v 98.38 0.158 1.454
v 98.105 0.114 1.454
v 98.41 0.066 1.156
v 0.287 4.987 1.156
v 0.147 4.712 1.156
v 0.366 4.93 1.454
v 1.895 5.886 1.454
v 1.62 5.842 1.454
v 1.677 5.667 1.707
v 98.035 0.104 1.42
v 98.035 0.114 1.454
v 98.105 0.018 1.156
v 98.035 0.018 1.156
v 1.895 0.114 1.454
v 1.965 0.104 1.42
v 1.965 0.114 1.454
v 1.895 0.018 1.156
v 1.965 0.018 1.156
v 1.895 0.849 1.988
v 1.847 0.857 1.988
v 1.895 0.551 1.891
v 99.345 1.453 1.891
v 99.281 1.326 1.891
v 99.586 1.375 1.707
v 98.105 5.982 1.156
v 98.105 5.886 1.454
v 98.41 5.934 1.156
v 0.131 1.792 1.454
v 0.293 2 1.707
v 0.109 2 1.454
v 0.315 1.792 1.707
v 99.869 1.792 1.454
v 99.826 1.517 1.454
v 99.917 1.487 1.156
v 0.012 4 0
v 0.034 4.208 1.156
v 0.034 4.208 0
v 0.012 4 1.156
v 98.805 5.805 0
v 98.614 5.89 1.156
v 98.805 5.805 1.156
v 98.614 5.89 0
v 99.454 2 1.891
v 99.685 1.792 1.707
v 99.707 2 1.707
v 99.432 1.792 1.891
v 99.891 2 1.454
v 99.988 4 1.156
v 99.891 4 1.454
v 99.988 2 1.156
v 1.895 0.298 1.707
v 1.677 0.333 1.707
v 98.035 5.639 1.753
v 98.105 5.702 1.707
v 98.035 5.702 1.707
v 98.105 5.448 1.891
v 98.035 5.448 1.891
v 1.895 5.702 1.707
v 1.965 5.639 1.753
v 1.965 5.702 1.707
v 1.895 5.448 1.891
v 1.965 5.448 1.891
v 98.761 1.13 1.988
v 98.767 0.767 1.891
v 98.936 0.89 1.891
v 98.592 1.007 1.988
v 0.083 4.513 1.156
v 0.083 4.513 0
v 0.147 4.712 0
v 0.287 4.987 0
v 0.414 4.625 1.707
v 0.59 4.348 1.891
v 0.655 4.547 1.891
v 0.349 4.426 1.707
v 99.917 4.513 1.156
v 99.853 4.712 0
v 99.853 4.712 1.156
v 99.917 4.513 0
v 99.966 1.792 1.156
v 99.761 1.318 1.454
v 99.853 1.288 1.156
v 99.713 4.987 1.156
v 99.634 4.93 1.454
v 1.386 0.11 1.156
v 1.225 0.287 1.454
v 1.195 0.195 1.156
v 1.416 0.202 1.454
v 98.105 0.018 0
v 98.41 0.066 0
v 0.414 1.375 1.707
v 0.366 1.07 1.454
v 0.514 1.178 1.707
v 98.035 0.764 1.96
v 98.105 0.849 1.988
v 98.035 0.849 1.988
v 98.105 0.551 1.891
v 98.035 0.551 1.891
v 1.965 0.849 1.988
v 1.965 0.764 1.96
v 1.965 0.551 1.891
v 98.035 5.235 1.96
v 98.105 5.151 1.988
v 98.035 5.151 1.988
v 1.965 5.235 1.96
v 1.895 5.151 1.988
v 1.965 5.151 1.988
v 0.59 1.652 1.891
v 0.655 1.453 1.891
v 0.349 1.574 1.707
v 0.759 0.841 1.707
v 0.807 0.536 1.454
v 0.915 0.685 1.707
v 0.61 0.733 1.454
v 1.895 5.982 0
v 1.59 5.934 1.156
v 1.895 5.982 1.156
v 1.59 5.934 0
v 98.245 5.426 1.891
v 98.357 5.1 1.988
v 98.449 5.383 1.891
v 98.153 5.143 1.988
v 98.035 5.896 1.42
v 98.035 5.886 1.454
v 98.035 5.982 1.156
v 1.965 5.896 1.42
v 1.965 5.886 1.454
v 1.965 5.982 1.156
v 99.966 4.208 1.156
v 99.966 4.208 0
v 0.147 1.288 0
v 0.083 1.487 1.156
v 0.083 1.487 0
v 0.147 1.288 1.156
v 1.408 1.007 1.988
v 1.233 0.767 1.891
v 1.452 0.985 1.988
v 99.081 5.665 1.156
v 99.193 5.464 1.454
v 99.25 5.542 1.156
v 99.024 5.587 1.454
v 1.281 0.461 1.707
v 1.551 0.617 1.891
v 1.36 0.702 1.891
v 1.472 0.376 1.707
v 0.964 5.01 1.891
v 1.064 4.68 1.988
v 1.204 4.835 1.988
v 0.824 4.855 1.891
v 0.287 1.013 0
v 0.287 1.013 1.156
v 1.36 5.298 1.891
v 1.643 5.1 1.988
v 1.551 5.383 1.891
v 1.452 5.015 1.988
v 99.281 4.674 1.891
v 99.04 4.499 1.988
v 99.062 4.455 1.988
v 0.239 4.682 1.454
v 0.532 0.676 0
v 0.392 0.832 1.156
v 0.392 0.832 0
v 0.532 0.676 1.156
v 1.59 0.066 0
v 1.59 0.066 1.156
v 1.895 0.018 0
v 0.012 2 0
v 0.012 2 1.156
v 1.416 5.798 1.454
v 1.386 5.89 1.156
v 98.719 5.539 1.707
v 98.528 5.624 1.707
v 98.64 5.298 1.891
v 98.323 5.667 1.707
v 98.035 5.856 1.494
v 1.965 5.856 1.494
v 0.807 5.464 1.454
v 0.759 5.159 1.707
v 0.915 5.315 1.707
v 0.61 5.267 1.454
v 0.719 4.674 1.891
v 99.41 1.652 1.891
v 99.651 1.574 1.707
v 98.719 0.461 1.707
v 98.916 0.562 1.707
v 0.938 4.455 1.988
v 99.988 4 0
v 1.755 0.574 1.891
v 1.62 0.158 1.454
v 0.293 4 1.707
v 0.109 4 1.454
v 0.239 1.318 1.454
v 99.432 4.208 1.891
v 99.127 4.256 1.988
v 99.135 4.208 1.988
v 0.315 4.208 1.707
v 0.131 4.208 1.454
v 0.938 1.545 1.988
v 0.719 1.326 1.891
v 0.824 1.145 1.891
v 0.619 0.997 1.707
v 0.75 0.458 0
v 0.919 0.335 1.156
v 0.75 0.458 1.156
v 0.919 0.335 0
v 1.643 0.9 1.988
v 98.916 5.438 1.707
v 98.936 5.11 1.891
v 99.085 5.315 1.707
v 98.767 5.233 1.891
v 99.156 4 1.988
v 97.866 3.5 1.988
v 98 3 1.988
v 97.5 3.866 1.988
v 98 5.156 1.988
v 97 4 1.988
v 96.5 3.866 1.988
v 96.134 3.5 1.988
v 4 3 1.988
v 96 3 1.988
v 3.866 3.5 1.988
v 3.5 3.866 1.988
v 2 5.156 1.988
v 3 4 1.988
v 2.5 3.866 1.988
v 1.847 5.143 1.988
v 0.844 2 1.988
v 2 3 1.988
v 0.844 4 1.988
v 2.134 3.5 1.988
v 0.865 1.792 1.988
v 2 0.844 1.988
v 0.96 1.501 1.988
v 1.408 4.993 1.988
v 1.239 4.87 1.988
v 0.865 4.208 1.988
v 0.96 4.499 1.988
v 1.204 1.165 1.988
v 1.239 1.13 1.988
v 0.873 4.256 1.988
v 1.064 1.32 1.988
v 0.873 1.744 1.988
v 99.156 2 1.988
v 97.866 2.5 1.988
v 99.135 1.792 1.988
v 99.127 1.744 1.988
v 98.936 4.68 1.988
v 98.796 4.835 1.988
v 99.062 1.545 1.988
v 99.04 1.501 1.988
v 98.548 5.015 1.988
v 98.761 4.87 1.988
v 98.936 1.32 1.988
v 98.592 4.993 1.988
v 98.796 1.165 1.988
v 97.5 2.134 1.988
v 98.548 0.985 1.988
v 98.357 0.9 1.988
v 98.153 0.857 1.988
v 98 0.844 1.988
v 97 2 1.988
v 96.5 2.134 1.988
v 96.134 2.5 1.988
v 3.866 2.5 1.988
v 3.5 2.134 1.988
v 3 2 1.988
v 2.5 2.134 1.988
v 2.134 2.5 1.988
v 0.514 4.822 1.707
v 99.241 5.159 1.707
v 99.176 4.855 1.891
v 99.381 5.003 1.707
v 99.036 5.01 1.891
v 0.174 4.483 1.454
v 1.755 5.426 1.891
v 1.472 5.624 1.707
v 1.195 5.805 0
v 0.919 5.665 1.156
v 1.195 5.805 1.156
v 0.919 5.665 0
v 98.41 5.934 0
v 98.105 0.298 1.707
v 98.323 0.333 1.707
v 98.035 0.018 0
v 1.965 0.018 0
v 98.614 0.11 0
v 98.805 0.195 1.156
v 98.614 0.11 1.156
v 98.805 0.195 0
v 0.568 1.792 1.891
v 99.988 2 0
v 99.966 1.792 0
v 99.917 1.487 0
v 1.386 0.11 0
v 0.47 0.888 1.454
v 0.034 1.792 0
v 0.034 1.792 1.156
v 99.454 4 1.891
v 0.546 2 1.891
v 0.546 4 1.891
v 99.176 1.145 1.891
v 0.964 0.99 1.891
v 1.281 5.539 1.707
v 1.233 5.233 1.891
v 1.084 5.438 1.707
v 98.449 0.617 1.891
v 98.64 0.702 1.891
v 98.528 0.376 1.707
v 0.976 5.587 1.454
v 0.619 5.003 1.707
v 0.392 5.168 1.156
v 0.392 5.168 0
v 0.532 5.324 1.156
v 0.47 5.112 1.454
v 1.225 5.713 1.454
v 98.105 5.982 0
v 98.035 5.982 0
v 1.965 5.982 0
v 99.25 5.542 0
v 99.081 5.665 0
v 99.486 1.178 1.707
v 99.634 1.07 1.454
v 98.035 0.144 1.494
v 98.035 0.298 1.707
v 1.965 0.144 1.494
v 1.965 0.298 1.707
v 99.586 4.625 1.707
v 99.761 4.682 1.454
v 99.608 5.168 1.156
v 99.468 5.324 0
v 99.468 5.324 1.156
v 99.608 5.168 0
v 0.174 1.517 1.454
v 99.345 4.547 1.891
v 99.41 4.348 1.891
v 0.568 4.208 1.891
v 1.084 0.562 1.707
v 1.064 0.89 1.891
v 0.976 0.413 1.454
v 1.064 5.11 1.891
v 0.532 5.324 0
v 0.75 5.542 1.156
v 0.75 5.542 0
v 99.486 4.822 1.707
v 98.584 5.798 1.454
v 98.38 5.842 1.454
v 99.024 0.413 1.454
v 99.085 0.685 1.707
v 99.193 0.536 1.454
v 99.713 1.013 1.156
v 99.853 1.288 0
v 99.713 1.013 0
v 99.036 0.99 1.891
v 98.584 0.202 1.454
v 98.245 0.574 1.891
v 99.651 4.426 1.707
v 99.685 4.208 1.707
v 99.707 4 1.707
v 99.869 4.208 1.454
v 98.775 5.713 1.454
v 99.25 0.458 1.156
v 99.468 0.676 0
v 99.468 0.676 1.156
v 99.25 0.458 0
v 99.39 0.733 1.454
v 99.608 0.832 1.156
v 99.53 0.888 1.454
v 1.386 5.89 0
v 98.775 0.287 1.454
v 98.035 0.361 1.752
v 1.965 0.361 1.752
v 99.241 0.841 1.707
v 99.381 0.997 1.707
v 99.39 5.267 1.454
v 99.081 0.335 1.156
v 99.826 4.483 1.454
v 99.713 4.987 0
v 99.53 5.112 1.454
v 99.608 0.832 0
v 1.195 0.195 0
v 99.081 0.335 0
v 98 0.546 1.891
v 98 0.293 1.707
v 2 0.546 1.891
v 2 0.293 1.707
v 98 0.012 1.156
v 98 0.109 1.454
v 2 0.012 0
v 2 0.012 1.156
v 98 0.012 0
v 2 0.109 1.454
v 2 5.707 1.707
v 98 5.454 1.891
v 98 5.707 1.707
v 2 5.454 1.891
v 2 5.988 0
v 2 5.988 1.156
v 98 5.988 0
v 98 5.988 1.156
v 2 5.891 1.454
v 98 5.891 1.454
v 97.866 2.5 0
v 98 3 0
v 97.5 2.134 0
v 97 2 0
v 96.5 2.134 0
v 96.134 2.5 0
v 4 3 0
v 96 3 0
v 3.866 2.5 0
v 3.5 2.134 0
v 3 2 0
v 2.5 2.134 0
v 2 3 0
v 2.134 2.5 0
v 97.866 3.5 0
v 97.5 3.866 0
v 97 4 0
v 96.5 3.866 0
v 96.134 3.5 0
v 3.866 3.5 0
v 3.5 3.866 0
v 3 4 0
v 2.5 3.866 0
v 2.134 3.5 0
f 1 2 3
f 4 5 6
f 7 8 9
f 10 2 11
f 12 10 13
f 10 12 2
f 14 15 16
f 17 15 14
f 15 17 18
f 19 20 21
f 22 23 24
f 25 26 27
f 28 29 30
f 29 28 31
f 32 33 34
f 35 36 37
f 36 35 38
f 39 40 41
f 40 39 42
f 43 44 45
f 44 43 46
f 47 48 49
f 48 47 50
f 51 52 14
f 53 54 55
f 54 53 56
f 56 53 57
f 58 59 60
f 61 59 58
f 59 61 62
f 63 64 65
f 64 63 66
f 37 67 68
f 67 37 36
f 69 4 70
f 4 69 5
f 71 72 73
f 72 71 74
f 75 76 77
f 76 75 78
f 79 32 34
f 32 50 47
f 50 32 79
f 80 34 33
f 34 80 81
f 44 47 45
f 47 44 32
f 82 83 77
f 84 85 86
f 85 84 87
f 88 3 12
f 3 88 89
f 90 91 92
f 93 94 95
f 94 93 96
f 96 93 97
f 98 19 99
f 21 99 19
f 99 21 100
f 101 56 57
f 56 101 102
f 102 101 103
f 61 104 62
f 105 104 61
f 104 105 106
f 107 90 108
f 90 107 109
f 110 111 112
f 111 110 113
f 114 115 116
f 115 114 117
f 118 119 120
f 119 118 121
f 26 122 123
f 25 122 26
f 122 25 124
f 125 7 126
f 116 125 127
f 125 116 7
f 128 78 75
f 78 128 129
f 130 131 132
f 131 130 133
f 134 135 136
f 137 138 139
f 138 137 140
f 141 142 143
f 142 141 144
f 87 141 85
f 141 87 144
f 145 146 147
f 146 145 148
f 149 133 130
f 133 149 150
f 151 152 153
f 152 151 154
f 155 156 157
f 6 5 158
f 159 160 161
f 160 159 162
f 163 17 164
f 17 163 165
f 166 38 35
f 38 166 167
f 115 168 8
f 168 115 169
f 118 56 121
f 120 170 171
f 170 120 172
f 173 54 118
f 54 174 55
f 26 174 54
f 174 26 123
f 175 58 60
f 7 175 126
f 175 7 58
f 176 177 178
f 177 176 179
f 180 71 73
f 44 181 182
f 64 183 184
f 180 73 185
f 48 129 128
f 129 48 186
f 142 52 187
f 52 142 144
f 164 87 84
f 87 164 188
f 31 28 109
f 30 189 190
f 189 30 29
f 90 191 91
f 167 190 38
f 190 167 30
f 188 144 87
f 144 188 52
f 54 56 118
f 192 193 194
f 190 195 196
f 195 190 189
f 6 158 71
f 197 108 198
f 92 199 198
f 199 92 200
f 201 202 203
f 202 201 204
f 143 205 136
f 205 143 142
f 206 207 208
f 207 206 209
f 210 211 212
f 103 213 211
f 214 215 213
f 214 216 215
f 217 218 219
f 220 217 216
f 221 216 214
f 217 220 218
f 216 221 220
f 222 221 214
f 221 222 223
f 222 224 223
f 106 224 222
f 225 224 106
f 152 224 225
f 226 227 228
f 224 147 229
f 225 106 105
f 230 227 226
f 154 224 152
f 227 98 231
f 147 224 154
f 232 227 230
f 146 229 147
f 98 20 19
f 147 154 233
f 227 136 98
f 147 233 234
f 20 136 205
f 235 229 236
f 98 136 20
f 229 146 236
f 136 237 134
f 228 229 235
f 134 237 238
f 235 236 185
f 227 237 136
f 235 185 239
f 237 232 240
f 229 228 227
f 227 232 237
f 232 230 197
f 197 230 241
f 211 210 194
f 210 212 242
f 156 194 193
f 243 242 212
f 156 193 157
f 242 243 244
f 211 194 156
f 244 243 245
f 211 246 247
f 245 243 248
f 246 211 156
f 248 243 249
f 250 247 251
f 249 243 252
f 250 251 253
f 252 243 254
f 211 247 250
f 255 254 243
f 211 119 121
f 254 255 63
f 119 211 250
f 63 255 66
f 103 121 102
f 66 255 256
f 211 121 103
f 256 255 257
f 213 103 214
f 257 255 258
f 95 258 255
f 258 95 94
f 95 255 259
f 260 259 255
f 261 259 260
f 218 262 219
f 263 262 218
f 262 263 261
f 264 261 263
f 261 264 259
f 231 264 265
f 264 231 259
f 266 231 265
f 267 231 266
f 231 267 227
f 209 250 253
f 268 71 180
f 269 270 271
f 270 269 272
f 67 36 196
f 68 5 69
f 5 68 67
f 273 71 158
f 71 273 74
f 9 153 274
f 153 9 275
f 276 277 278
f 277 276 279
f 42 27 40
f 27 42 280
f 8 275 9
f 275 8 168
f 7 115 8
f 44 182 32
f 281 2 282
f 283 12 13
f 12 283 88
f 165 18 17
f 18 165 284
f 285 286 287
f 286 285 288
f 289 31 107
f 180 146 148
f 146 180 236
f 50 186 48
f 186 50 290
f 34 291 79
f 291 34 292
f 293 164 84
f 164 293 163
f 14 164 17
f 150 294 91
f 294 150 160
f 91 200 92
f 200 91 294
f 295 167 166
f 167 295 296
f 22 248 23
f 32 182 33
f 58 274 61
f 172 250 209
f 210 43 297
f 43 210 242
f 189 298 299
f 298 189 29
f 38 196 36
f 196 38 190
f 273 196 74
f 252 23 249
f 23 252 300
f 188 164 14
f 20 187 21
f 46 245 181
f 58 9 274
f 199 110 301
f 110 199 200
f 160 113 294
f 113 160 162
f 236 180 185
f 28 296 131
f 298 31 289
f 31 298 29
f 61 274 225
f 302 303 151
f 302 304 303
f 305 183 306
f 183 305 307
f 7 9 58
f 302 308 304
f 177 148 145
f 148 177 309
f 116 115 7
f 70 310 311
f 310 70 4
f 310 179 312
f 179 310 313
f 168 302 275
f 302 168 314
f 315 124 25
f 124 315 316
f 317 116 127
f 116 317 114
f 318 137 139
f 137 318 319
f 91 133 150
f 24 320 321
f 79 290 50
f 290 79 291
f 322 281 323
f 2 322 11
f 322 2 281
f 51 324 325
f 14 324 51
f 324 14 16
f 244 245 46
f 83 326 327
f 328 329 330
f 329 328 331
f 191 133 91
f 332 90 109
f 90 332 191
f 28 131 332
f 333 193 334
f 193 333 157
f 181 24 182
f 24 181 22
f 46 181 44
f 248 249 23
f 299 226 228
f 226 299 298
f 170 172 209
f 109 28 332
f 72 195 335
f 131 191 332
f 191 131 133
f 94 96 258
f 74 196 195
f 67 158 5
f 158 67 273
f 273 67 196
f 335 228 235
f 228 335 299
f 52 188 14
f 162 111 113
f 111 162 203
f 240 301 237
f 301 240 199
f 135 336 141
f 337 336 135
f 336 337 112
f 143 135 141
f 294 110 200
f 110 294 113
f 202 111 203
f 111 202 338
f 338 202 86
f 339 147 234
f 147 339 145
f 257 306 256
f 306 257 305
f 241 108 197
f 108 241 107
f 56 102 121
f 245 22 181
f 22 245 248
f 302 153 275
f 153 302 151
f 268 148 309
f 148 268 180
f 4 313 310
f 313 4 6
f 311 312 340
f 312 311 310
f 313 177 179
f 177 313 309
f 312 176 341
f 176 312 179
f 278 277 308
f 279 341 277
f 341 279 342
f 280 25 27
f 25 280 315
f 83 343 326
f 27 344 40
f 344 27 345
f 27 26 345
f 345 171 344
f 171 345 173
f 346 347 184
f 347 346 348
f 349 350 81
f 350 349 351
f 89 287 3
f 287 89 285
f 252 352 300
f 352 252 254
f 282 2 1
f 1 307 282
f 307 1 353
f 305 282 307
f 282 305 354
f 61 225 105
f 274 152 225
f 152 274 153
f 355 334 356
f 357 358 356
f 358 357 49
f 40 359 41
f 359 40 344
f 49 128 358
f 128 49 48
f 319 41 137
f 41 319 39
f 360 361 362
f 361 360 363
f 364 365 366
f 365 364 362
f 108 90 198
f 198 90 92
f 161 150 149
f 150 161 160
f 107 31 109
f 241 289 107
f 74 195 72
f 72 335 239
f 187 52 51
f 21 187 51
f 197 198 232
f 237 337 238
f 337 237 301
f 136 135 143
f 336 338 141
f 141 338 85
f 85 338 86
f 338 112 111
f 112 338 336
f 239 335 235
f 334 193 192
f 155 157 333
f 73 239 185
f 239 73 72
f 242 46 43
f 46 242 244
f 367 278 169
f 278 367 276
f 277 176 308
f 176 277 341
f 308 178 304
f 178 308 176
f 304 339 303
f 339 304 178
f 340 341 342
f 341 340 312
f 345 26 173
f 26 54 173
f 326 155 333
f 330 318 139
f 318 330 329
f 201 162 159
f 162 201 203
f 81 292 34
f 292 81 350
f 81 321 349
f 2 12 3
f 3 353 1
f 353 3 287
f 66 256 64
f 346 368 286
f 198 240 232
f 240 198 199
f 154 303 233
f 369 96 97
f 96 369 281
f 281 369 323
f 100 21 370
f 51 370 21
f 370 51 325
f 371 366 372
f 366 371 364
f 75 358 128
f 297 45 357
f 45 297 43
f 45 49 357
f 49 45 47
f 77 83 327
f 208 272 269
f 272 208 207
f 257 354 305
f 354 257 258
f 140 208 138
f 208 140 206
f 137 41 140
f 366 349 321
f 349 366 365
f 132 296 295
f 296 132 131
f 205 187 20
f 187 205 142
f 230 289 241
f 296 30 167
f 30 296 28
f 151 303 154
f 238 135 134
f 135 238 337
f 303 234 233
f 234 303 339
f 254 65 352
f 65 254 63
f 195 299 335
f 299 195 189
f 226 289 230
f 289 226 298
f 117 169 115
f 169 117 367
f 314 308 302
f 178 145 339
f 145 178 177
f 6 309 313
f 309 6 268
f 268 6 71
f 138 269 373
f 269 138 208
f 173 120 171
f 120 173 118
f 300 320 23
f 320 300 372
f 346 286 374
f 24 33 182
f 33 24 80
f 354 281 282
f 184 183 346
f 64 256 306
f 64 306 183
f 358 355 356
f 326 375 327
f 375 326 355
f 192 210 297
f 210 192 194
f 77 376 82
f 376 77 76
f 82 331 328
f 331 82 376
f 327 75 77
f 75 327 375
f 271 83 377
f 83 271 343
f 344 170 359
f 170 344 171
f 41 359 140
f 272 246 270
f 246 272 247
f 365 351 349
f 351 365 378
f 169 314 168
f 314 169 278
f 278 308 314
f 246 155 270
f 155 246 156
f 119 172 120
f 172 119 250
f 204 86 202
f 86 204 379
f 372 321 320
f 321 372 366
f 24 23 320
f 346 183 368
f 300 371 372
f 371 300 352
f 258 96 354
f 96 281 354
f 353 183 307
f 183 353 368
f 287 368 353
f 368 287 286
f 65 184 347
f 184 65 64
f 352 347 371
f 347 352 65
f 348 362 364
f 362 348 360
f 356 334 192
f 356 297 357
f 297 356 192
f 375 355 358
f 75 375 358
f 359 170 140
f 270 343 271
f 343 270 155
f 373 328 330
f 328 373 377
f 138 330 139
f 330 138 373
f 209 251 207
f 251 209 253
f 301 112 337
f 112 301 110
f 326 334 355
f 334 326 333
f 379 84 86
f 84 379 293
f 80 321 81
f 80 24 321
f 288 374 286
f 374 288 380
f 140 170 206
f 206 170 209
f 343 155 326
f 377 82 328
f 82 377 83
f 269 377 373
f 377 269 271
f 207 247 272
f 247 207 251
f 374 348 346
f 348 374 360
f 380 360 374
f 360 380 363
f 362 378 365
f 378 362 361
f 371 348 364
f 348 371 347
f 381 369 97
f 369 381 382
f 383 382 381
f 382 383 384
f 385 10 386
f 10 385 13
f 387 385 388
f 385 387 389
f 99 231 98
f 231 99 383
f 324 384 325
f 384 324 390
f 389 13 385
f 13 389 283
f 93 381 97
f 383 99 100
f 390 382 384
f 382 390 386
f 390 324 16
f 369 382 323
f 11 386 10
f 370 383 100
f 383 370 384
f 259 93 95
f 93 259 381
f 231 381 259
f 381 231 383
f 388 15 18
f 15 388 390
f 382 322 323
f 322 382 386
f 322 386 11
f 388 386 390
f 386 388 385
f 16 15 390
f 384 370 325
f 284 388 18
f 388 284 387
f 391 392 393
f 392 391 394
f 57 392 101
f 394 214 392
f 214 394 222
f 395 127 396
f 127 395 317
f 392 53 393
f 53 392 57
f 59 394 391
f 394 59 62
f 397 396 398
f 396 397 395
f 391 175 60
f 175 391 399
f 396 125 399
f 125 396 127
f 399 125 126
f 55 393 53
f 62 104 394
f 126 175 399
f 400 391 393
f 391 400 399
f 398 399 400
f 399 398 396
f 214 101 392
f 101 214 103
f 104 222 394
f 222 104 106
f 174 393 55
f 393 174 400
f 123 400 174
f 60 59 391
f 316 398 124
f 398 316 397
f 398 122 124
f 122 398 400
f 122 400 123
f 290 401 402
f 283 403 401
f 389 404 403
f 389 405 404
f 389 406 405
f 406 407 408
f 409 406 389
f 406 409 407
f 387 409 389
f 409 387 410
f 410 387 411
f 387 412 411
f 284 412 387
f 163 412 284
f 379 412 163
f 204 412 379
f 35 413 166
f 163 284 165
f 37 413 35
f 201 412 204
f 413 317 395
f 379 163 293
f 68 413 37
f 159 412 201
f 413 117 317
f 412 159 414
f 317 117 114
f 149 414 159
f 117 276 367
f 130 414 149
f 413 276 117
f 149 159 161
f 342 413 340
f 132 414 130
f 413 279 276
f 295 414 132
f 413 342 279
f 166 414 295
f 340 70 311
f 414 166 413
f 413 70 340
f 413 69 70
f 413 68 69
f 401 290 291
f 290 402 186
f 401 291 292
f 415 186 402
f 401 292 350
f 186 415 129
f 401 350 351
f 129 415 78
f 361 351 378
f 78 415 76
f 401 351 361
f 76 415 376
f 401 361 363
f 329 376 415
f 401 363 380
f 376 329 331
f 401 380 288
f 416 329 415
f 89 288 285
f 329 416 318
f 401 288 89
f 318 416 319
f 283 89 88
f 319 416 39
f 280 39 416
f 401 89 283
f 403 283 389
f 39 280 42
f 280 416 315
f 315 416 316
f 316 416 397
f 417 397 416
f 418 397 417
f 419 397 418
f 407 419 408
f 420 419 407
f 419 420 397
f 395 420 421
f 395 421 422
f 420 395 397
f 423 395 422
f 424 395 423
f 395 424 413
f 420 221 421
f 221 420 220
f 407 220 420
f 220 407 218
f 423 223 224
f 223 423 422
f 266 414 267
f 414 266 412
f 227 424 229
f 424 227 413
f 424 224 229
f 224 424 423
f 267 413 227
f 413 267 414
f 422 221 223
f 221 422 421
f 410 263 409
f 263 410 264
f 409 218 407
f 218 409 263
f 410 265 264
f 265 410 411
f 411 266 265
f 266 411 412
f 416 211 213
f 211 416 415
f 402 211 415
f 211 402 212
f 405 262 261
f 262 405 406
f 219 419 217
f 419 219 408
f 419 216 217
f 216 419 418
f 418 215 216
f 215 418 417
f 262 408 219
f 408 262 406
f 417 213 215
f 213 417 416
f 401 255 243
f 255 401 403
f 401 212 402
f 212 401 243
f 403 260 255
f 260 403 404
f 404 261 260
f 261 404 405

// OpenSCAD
difference() {
  intersection(){
    cube([100,6,2]);
    minkowski(){
      translate([1,1]) linear_extrude(1) rounded_rect(98,4,1);
      sphere(1,$fn=20);
    }
  }
  translate([3,3,-.01]) cylinder(d=2,h=3,$fn=12);
  translate([97,3,-.01]) cylinder(d=2,h=3,$fn=12);
  *translate([0,-.01,.4]) rotate([0,-3]) cube([40,8,3]);
  *translate([100,-.01,.4]) mirror([1,0]) rotate([0,-3]) cube([40,8,3]);
}
module rounded_rect(w,h,r) {
  translate([r,r]) circle(d=r*2,$fn=30);
  translate([r,h-r]) circle(d=r*2,$fn=30);
  translate([w-r,h-r]) circle(d=r*2,$fn=30);
  translate([w-r,r]) circle(d=r*2,$fn=30);
  translate([r,0]) square([w-r*2,h]);
  translate([0,r]) square([r,h-r*2]);
  translate([w-r,r]) square([r,h-r*2]);
}
